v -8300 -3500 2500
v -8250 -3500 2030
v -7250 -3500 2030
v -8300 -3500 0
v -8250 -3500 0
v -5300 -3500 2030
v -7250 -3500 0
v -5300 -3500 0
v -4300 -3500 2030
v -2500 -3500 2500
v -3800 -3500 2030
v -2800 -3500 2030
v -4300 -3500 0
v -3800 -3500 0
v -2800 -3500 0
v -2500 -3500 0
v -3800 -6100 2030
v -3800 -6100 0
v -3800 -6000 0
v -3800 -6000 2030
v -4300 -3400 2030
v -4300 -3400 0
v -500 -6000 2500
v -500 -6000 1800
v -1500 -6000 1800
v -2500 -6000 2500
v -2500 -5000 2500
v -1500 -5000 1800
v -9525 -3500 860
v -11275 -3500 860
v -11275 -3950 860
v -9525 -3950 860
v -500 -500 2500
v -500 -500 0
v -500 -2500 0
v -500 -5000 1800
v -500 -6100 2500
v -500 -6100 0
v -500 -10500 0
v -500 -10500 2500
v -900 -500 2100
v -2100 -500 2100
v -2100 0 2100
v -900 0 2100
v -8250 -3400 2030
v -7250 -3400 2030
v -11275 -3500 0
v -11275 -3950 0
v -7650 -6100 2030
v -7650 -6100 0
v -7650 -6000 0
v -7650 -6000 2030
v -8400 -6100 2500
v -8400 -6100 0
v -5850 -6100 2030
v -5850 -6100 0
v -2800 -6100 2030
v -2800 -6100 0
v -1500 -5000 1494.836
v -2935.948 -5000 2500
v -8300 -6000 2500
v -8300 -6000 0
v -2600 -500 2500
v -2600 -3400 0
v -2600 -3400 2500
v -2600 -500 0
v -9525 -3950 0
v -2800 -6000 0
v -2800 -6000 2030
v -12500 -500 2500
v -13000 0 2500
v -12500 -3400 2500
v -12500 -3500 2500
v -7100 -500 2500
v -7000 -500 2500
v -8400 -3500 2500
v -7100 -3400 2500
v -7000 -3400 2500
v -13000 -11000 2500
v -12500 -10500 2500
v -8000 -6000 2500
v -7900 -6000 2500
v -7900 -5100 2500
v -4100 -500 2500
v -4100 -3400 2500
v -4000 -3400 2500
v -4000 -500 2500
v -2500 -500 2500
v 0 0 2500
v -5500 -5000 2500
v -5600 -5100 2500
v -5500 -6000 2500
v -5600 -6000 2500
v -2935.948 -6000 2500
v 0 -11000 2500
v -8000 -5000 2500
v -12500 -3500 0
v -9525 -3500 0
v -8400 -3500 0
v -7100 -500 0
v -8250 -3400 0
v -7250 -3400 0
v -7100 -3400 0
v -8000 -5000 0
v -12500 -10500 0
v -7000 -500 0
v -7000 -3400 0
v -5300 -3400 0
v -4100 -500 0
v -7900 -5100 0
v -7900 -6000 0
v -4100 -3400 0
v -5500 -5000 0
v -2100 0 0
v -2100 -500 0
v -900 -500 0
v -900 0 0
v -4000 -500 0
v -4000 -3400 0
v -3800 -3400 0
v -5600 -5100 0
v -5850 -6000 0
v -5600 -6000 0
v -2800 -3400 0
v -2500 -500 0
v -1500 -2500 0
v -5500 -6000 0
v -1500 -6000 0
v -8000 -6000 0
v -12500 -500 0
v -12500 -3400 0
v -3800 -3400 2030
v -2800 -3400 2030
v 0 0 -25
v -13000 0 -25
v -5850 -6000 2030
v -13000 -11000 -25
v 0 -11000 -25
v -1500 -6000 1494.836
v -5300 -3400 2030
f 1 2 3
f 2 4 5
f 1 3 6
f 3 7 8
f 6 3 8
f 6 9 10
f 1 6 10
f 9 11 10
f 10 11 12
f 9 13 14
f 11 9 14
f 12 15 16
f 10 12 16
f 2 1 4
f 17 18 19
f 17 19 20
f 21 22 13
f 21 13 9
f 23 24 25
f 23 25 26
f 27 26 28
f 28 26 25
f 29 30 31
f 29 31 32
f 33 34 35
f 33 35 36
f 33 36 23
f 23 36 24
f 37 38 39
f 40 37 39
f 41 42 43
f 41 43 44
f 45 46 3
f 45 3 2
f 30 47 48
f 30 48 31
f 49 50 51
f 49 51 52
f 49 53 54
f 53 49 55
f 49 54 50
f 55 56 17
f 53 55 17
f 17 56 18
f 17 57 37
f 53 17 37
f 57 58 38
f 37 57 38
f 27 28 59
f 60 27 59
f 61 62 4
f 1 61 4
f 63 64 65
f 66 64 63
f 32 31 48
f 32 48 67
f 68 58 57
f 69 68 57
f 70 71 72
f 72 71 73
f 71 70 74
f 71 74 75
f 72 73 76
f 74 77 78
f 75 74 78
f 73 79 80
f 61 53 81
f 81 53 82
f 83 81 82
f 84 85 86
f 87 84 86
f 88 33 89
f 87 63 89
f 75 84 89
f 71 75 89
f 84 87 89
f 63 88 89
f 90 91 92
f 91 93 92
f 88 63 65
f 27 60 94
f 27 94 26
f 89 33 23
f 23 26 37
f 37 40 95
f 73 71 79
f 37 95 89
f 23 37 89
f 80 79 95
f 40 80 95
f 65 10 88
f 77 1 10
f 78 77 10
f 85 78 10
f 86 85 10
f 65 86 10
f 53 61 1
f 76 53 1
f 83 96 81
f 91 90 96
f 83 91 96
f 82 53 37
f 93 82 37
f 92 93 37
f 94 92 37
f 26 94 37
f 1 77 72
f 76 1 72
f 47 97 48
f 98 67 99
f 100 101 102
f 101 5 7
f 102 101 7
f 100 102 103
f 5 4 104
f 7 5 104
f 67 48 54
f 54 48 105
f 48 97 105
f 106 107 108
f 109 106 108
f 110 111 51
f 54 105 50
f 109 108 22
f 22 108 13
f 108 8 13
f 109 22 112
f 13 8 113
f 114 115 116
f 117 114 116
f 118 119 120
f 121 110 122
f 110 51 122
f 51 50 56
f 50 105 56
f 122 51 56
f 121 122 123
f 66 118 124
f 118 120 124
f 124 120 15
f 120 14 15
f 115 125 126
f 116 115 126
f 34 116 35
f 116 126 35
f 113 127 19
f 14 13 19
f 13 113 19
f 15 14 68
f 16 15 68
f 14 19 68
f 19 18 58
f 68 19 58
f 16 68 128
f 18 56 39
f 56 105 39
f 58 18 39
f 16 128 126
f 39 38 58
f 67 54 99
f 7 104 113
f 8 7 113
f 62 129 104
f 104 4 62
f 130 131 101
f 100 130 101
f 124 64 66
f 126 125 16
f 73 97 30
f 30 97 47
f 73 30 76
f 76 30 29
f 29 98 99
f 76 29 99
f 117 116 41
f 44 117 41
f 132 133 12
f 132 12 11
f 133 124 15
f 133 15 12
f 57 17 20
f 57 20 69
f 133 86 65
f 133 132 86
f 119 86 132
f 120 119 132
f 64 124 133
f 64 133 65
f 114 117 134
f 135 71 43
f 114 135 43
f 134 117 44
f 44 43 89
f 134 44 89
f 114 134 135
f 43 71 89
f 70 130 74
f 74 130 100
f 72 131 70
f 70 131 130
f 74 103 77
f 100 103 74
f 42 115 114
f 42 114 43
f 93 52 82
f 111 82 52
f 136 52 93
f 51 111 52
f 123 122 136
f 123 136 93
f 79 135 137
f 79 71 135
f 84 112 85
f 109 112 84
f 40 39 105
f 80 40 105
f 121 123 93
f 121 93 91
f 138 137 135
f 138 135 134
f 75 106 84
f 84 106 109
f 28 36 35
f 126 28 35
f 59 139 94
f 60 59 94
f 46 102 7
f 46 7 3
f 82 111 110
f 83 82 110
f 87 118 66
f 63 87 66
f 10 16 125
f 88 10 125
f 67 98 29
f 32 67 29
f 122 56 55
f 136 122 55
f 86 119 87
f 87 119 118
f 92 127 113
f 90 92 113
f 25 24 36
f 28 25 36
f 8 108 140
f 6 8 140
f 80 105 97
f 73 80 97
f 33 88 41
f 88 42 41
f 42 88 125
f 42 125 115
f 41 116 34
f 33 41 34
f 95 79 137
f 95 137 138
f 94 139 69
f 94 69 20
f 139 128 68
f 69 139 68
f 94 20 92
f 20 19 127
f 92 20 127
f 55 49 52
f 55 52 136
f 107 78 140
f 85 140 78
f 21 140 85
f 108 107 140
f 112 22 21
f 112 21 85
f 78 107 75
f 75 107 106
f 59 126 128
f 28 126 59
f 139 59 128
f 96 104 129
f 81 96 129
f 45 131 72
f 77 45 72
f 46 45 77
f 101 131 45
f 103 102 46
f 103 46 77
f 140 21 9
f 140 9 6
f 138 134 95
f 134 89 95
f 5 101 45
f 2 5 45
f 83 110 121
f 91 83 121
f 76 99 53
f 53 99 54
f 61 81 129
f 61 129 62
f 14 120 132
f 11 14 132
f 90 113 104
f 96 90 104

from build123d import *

# Parameters (mm, degrees)
F0_W      = 13000
F0_H      = 11000
F0_W_2    = 2300
F0_H_2    = 900
F0_W_3    = 5400
F0_H_3    = 2900
F0_W_4    = 2900
F0_W_5    = 1400
F1_DEPTH  = 2500
F2_W      = 1200
F2_H      = 2100
F3_DEPTH  = 500
F4_W      = 1000
F4_H      = 2030
F5_DEPTH  = 100
F6_W      = 1800
F6_H      = 2030
F6_W_2    = 1000
F7_DEPTH  = 100
F8_W      = 1750
F8_H      = 860
F9_DEPTH  = 450
F10_W     = 13000
F10_H     = 11000
F11_DEPTH = 25
F13_DEPTH = 1000
F15_DEPTH = 1000


with BuildPart() as f1:
    # F0 (on Top) → F1 (new body)
    with BuildSketch(Plane.XY):
        with Locations((-6500, -5500)):
            Rectangle(F0_W, F0_H)
        with Locations((-6750, -5550)):
            Rectangle(F0_W_2, F0_H_2, mode=Mode.SUBTRACT)
        Polygon((-500, -10500), (-12500, -10500), (-12500, -3500), (-8400, -3500), (-8400, -6100), (-500, -6100), align=None, mode=Mode.SUBTRACT)
        with Locations((-9800, -1950)):
            Rectangle(F0_W_3, F0_H_3, mode=Mode.SUBTRACT)
        Polygon((-8300, -6000), (-8300, -3500), (-2500, -3500), (-2500, -500), (-500, -500), (-500, -6000), (-5500, -6000), (-5500, -5000), (-8000, -5000), (-8000, -6000), align=None, mode=Mode.SUBTRACT)
        with Locations((-5550, -1950)):
            Rectangle(F0_W_4, F0_H_3, mode=Mode.SUBTRACT)
        with Locations((-3300, -1950)):
            Rectangle(F0_W_5, F0_H_3, mode=Mode.SUBTRACT)
    extrude(amount=F1_DEPTH)

    # F2 (on face) → F3 (cut, through all)
    with BuildSketch(Plane.XZ.offset(500)):
        with Locations((-1500, 1050)):
            Rectangle(F2_W, F2_H)
    extrude(amount=-F3_DEPTH, mode=Mode.SUBTRACT)

    # F4 (on face) → F5 (cut, through all)
    with BuildSketch(Plane(origin=(0, -3400, 0), x_dir=(-1, 0, 0), z_dir=(0, 1, 0))):
        with Locations((3300, 1015)):
            Rectangle(F4_W, F4_H)
        with Locations((4800, 1015)):
            Rectangle(F4_W, F4_H)
        with Locations((7750, 1015)):
            Rectangle(F4_W, F4_H)
    extrude(amount=-F5_DEPTH, mode=Mode.SUBTRACT)

    # F6 (on face) → F7 (cut, through all)
    with BuildSketch(Plane.XZ.offset(6100)):
        with Locations((-6750, 1015)):
            Rectangle(F6_W, F6_H)
        with Locations((-3300, 1015)):
            Rectangle(F6_W_2, F6_H)
    extrude(amount=-F7_DEPTH, mode=Mode.SUBTRACT)

    # F8 (on face) → F9 (join)
    with BuildSketch(Plane.XZ.offset(3500)):
        with Locations((-10400, 430)):
            Rectangle(F8_W, F8_H)
    extrude(amount=F9_DEPTH)

    # F10 (on face) → F11 (join)
    with BuildSketch(Plane(origin=(0, 0, 0), x_dir=(1, 0, 0), z_dir=(0, 0, -1))):
        with Locations((-6500, 5500)):
            Rectangle(F10_W, F10_H)
    extrude(amount=F11_DEPTH)

    # F12 (on face) → F13 (join)
    with BuildSketch(Plane(origin=(-500, 0, 0), x_dir=(0, -1, 0), z_dir=(-1, 0, 0))):
        Polygon((2500, 0), (6000, 0), (6000, 1800), (5000, 1800), align=None)
    extrude(amount=F13_DEPTH)

    # F14 (on face) → F15 (join)
    with BuildSketch(Plane(origin=(0, -6000, 0), x_dir=(-1, 0, 0), z_dir=(0, 1, 0))):
        Polygon((2500, 2500), (1500, 1800), (1500, 1494.83611), (2935.948415, 2500), align=None)
    extrude(amount=F15_DEPTH)


solid = f1.part
